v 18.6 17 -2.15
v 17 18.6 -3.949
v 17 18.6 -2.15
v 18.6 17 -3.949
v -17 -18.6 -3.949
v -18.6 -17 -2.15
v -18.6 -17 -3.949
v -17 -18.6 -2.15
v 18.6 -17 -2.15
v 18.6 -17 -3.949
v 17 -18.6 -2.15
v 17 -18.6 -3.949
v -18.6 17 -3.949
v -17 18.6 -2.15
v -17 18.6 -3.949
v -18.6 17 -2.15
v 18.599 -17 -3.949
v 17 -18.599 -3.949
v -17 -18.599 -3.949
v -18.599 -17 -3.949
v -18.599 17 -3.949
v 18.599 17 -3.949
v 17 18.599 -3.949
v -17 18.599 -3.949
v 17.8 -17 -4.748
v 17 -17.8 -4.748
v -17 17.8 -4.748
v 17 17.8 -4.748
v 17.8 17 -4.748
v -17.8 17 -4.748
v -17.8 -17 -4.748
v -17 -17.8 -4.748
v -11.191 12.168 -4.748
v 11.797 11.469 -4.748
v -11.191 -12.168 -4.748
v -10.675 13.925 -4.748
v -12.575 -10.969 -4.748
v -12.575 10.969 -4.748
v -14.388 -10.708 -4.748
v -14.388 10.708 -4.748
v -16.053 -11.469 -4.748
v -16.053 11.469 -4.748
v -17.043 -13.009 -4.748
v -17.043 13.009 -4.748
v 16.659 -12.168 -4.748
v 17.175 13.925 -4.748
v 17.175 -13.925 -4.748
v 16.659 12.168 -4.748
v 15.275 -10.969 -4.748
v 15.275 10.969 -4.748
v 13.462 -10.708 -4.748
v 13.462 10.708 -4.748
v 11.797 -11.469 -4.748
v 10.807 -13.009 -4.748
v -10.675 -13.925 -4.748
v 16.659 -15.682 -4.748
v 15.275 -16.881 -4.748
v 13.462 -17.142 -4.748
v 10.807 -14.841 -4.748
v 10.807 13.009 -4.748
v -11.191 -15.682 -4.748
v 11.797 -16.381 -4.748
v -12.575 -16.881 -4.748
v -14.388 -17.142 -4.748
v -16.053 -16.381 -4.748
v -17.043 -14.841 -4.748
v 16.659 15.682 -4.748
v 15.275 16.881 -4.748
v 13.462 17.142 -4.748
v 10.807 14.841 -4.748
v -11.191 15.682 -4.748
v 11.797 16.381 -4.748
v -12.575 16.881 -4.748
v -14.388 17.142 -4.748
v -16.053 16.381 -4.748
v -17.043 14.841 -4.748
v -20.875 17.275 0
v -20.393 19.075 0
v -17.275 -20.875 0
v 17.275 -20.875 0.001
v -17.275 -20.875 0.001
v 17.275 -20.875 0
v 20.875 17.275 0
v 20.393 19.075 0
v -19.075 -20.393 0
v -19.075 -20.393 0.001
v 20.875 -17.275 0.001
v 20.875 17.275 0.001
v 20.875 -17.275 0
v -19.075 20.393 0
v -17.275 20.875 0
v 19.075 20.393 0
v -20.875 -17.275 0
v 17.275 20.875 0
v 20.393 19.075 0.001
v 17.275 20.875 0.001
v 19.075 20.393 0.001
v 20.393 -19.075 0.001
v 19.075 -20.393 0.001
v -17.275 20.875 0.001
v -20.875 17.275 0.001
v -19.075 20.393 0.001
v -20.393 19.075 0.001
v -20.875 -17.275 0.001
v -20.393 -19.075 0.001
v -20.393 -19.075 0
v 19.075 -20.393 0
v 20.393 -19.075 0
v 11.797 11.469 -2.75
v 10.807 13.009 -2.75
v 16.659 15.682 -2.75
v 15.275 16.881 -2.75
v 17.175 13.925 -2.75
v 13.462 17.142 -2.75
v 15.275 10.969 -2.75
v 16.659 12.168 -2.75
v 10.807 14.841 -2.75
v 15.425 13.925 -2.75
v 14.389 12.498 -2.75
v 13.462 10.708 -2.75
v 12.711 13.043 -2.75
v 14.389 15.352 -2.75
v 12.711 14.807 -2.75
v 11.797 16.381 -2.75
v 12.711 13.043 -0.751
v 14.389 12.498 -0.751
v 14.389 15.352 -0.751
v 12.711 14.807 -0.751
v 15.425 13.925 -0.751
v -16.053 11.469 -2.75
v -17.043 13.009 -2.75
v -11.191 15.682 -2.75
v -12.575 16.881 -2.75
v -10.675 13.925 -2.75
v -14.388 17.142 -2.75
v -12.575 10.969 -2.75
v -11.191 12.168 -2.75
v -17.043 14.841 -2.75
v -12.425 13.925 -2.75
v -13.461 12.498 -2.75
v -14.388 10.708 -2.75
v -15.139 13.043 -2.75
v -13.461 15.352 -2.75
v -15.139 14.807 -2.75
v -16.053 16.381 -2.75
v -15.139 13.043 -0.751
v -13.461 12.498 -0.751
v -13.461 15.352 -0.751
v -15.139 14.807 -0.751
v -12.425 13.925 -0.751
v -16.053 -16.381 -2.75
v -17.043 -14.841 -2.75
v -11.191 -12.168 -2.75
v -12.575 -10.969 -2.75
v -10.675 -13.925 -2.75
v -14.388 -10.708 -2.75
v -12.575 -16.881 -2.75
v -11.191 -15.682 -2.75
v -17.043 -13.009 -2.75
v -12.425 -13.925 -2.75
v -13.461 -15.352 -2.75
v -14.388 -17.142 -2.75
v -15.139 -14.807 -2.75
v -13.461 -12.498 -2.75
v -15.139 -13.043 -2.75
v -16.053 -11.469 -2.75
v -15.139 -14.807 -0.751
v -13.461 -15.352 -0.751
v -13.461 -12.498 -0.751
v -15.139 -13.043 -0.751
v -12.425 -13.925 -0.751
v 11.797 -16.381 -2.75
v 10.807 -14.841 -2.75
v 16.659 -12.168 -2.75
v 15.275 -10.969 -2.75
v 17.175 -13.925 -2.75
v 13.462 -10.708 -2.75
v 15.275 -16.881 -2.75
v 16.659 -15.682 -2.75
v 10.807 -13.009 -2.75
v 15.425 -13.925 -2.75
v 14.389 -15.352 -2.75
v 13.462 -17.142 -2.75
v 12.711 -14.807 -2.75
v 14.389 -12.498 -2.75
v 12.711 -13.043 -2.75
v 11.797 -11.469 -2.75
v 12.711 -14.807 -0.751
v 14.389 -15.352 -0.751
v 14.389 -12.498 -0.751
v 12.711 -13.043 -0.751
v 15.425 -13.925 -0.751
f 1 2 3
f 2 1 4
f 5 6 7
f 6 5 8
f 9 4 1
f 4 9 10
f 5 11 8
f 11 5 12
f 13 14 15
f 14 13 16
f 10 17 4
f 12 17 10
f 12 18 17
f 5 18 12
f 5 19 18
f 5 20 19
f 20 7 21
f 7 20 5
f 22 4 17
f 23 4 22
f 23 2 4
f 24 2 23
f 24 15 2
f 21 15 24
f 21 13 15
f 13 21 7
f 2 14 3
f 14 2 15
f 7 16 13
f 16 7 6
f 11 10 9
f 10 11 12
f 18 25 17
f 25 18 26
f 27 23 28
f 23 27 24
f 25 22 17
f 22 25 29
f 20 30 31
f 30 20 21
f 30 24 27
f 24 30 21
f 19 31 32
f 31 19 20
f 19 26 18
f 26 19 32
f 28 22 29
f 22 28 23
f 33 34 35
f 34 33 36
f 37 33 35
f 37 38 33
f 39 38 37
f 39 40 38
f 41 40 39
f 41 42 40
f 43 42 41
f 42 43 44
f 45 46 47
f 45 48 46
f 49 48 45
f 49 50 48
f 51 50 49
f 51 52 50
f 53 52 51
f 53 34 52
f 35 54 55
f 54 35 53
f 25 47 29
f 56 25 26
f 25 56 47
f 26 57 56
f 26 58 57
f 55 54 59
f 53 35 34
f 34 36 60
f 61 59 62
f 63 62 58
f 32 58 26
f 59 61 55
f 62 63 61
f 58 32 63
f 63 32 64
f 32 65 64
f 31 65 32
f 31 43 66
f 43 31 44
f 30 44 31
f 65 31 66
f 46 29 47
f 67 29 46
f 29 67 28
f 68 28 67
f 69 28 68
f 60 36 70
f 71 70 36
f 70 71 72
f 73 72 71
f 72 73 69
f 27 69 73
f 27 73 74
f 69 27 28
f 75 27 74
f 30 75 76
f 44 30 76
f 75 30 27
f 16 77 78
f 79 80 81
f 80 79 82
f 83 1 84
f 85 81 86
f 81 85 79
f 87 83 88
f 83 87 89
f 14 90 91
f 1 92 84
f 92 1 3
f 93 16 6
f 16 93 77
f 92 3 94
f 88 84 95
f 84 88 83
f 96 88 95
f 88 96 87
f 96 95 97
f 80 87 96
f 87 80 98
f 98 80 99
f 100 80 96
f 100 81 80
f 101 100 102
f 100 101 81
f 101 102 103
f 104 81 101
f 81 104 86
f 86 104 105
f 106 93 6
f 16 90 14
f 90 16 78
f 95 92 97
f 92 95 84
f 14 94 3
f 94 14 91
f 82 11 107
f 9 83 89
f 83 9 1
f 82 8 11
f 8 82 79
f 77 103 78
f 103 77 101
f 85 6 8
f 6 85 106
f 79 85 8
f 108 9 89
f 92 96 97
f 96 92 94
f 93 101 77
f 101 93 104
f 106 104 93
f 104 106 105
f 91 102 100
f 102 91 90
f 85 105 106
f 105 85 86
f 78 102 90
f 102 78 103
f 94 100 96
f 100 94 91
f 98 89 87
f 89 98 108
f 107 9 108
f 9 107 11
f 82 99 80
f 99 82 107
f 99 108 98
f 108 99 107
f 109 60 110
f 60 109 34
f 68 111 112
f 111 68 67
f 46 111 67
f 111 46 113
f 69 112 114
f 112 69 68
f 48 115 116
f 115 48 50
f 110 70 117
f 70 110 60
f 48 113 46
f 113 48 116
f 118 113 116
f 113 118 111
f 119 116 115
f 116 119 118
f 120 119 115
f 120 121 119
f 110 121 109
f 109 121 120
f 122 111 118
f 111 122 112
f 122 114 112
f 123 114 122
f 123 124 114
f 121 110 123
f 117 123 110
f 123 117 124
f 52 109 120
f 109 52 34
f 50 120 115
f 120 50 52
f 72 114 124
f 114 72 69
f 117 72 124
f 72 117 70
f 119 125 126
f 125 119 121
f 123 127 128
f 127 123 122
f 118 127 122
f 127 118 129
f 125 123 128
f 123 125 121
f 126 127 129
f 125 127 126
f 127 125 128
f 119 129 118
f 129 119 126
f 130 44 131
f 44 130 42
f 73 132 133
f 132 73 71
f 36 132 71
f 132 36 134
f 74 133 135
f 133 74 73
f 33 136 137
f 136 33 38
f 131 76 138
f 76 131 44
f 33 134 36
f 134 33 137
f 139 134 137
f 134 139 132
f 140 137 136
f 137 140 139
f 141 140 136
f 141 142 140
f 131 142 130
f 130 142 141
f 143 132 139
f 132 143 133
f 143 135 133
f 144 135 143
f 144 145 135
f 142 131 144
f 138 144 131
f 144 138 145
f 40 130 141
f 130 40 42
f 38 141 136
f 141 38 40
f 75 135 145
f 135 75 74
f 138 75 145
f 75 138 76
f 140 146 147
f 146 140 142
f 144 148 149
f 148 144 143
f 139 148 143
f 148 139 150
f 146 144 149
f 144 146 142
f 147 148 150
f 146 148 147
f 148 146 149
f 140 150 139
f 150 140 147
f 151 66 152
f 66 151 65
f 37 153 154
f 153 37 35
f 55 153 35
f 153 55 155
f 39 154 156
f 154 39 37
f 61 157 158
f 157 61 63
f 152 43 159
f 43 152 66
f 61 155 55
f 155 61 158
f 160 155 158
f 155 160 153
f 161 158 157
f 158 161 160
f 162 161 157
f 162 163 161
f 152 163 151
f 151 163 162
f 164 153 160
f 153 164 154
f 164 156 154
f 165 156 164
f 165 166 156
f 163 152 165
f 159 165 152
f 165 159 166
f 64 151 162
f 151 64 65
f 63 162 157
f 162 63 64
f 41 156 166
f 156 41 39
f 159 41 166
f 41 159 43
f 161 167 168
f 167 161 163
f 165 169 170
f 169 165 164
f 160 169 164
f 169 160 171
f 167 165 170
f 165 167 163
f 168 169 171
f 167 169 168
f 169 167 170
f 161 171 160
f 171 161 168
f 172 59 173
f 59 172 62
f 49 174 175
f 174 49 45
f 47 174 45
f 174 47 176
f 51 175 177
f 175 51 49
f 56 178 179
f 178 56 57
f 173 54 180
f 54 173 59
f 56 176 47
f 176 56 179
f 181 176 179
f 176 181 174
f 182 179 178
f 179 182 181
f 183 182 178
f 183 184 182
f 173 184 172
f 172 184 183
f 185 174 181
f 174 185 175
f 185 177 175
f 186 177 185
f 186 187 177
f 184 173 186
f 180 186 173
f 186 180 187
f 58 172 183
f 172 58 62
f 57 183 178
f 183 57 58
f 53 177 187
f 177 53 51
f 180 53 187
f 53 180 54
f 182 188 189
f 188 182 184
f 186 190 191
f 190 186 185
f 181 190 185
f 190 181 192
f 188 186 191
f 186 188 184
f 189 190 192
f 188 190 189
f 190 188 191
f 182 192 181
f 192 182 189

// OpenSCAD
// file: ../lib/rounded_square.scad
module rounded_square(size, radius, center = false)
{
    new_size = is_list(size) ? [ size[0] - radius * 2, size[1] - radius * 2 ] : size - radius * 2;
    offset(radius) square(new_size, center);
}

rounded_square(size = 10, radius = 2, center = true);
// file: gridfinity_cup_base_vars.scad
cup_base_bottom_size = 35.6;
cup_base_middle_size = 37.2;
cup_base_top_size = 41.75;

bottom_slope_height = 0.8;
top_slope_height = 2.15;
middle_height = 1.8;

// All in degrees
bottom_radius = 1.6 / 2;
middle_radius = 3.2 / 2;
top_radius = 7.2 / 2;
// main file
include <gridfinity_cup_base_vars.scad>
use <../lib/rounded_square.scad>;

module gridfinity_cup_base(magnets = true)
{


    module base_no_magnets()
    {
        translate([ 0, 0, -top_slope_height ])
        {
            hull()
            {
                translate([ 0, 0, top_slope_height ]) linear_extrude(0.001)
                    rounded_square(cup_base_top_size, radius = top_radius, center = true);
                linear_extrude(0.001) rounded_square(cup_base_middle_size, radius = middle_radius, center = true);
            }
            translate([ 0, 0, -middle_height + 0.001 ])
            {

                linear_extrude(middle_height)
                    rounded_square(cup_base_middle_size, radius = middle_radius, center = true);
                translate([ 0, 0, -bottom_slope_height + 0.001 ])
                {
                    hull()
                    {
                        linear_extrude(0.001)
                            rounded_square(cup_base_bottom_size, radius = bottom_radius, center = true);
                        translate([ 0, 0, bottom_slope_height ]) linear_extrude(0.001)
                            rounded_square(cup_base_middle_size, radius = middle_radius, center = true);
                    }
                }
            }
        }
    }

    module magnet()
    {
        height = 2;
        outter_radius = 3.25;
        inner_radius = 1.5;
        translate([ 0, 0, height / 2 ])
        {
            cylinder(h = height, r = outter_radius, center = true);
            translate([ 0, 0, height - 0.001 ]) cylinder(h = height, r = inner_radius, center = true);
        }
    }

    if (magnets)
    {
        magnet_xy_offset = (cup_base_bottom_size - 7.75) / 2;
        magnet_z_offset = -middle_height - top_slope_height - bottom_slope_height;
        difference()
        {
            base_no_magnets();
            translate([ magnet_xy_offset, magnet_xy_offset, magnet_z_offset ]) magnet();
            translate([ -magnet_xy_offset, magnet_xy_offset, magnet_z_offset ]) magnet();
            translate([ -magnet_xy_offset, -magnet_xy_offset, magnet_z_offset ]) magnet();
            translate([ magnet_xy_offset, -magnet_xy_offset, magnet_z_offset ]) magnet();
        }
    }
    else
    {
        base_no_magnets();
    }
}

gridfinity_cup_base(magnets = true);
